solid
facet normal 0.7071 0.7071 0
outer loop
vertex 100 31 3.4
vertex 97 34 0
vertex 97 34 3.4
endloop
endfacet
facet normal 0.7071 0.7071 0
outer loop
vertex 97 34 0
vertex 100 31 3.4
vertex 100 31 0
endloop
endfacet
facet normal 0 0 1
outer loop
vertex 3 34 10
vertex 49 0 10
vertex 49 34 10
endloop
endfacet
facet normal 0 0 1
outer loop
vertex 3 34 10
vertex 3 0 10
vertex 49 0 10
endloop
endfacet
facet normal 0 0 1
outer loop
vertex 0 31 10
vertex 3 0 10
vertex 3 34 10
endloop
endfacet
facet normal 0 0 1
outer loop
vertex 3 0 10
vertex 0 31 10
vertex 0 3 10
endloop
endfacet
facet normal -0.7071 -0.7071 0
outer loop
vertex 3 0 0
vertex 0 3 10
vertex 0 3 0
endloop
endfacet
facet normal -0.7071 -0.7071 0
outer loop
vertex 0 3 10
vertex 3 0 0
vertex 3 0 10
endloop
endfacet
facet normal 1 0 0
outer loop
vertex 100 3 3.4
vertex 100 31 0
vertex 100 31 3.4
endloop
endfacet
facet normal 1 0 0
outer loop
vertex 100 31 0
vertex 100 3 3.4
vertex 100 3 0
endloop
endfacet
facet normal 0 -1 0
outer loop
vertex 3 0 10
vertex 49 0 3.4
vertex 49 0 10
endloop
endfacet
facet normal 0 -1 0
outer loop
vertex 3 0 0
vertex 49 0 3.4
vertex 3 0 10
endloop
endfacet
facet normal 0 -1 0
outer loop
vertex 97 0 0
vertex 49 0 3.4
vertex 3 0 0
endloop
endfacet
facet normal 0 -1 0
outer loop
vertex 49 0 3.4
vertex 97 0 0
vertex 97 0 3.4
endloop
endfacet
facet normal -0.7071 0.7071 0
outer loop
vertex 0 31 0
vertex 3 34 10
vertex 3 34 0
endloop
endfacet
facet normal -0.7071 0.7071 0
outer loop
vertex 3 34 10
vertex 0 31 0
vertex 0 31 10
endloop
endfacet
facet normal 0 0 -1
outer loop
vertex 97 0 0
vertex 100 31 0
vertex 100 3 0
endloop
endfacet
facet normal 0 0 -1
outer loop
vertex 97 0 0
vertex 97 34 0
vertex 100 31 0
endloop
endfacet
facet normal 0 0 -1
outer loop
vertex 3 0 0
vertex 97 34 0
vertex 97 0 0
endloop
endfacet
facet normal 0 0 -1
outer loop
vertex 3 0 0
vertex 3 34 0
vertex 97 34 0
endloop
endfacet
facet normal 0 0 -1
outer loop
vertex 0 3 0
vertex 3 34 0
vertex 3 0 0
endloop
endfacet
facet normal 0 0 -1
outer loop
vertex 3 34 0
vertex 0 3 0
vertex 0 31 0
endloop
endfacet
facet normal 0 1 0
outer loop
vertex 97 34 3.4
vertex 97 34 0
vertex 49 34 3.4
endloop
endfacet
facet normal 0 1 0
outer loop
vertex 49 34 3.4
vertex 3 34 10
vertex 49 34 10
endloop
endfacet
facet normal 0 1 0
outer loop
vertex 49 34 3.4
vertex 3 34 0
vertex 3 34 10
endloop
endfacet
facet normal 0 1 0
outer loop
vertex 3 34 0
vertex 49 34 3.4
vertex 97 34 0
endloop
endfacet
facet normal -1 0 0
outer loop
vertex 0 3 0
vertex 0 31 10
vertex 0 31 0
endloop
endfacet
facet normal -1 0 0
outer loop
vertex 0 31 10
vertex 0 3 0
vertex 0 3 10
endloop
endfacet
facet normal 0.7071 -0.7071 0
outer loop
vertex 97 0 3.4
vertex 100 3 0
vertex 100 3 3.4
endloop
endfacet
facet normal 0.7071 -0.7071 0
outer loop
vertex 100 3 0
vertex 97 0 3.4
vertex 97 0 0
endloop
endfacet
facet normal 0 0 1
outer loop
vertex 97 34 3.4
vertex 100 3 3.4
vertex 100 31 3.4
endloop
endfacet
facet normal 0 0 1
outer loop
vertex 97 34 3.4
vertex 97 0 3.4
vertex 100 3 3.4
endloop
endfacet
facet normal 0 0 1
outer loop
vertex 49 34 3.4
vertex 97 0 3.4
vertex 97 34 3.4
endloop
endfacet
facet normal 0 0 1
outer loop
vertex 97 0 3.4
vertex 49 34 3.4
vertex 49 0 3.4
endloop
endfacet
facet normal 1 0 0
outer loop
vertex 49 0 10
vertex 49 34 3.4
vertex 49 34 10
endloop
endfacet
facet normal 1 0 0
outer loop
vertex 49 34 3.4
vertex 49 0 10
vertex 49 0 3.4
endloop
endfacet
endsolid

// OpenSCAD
$fn = 32;

// ----------------------------------------------------------------------
// Stepped bar: endstep, 100 x 34 x 10/3.4 mm
// ----------------------------------------------------------------------

// --- parameters (mm) ---
bar_l = 100;              // bar length, X
bar_w = 34;               // bar width, Y
plate_t = 10;             // thickness of the thick zone, Z
thin_t = 3.4;             // thickness of the thin zone
corner_c = 3;             // corner chamfer of the bar
step_cut = 6.6;           // material removed from the thin zone
step_x = 49;              // step position from the left end
depth_1 = 6.6;            // depth of cut 1 from the top face
fit_tol = 0.02;           // declared fit tolerance (prompt contract)
free_tol = 0.2;           // declared free tolerance (prompt contract)

profile = [[3, 0], [97, 0], [100, 3], [100, 31], [97, 34], [3, 34], [0, 31], [0, 3]];  // primary outline, 8 points, counter clockwise
void_1 = [[49, -1], [101, -1], [101, 35], [49, 35]];  // thin zone beyond the step, 4 points

// --- the one profile operation ---
difference() {
  linear_extrude(height = plate_t) polygon(points = profile);
  translate([0, 0, plate_t - depth_1])
    linear_extrude(height = depth_1 + 1) polygon(points = void_1);
}
